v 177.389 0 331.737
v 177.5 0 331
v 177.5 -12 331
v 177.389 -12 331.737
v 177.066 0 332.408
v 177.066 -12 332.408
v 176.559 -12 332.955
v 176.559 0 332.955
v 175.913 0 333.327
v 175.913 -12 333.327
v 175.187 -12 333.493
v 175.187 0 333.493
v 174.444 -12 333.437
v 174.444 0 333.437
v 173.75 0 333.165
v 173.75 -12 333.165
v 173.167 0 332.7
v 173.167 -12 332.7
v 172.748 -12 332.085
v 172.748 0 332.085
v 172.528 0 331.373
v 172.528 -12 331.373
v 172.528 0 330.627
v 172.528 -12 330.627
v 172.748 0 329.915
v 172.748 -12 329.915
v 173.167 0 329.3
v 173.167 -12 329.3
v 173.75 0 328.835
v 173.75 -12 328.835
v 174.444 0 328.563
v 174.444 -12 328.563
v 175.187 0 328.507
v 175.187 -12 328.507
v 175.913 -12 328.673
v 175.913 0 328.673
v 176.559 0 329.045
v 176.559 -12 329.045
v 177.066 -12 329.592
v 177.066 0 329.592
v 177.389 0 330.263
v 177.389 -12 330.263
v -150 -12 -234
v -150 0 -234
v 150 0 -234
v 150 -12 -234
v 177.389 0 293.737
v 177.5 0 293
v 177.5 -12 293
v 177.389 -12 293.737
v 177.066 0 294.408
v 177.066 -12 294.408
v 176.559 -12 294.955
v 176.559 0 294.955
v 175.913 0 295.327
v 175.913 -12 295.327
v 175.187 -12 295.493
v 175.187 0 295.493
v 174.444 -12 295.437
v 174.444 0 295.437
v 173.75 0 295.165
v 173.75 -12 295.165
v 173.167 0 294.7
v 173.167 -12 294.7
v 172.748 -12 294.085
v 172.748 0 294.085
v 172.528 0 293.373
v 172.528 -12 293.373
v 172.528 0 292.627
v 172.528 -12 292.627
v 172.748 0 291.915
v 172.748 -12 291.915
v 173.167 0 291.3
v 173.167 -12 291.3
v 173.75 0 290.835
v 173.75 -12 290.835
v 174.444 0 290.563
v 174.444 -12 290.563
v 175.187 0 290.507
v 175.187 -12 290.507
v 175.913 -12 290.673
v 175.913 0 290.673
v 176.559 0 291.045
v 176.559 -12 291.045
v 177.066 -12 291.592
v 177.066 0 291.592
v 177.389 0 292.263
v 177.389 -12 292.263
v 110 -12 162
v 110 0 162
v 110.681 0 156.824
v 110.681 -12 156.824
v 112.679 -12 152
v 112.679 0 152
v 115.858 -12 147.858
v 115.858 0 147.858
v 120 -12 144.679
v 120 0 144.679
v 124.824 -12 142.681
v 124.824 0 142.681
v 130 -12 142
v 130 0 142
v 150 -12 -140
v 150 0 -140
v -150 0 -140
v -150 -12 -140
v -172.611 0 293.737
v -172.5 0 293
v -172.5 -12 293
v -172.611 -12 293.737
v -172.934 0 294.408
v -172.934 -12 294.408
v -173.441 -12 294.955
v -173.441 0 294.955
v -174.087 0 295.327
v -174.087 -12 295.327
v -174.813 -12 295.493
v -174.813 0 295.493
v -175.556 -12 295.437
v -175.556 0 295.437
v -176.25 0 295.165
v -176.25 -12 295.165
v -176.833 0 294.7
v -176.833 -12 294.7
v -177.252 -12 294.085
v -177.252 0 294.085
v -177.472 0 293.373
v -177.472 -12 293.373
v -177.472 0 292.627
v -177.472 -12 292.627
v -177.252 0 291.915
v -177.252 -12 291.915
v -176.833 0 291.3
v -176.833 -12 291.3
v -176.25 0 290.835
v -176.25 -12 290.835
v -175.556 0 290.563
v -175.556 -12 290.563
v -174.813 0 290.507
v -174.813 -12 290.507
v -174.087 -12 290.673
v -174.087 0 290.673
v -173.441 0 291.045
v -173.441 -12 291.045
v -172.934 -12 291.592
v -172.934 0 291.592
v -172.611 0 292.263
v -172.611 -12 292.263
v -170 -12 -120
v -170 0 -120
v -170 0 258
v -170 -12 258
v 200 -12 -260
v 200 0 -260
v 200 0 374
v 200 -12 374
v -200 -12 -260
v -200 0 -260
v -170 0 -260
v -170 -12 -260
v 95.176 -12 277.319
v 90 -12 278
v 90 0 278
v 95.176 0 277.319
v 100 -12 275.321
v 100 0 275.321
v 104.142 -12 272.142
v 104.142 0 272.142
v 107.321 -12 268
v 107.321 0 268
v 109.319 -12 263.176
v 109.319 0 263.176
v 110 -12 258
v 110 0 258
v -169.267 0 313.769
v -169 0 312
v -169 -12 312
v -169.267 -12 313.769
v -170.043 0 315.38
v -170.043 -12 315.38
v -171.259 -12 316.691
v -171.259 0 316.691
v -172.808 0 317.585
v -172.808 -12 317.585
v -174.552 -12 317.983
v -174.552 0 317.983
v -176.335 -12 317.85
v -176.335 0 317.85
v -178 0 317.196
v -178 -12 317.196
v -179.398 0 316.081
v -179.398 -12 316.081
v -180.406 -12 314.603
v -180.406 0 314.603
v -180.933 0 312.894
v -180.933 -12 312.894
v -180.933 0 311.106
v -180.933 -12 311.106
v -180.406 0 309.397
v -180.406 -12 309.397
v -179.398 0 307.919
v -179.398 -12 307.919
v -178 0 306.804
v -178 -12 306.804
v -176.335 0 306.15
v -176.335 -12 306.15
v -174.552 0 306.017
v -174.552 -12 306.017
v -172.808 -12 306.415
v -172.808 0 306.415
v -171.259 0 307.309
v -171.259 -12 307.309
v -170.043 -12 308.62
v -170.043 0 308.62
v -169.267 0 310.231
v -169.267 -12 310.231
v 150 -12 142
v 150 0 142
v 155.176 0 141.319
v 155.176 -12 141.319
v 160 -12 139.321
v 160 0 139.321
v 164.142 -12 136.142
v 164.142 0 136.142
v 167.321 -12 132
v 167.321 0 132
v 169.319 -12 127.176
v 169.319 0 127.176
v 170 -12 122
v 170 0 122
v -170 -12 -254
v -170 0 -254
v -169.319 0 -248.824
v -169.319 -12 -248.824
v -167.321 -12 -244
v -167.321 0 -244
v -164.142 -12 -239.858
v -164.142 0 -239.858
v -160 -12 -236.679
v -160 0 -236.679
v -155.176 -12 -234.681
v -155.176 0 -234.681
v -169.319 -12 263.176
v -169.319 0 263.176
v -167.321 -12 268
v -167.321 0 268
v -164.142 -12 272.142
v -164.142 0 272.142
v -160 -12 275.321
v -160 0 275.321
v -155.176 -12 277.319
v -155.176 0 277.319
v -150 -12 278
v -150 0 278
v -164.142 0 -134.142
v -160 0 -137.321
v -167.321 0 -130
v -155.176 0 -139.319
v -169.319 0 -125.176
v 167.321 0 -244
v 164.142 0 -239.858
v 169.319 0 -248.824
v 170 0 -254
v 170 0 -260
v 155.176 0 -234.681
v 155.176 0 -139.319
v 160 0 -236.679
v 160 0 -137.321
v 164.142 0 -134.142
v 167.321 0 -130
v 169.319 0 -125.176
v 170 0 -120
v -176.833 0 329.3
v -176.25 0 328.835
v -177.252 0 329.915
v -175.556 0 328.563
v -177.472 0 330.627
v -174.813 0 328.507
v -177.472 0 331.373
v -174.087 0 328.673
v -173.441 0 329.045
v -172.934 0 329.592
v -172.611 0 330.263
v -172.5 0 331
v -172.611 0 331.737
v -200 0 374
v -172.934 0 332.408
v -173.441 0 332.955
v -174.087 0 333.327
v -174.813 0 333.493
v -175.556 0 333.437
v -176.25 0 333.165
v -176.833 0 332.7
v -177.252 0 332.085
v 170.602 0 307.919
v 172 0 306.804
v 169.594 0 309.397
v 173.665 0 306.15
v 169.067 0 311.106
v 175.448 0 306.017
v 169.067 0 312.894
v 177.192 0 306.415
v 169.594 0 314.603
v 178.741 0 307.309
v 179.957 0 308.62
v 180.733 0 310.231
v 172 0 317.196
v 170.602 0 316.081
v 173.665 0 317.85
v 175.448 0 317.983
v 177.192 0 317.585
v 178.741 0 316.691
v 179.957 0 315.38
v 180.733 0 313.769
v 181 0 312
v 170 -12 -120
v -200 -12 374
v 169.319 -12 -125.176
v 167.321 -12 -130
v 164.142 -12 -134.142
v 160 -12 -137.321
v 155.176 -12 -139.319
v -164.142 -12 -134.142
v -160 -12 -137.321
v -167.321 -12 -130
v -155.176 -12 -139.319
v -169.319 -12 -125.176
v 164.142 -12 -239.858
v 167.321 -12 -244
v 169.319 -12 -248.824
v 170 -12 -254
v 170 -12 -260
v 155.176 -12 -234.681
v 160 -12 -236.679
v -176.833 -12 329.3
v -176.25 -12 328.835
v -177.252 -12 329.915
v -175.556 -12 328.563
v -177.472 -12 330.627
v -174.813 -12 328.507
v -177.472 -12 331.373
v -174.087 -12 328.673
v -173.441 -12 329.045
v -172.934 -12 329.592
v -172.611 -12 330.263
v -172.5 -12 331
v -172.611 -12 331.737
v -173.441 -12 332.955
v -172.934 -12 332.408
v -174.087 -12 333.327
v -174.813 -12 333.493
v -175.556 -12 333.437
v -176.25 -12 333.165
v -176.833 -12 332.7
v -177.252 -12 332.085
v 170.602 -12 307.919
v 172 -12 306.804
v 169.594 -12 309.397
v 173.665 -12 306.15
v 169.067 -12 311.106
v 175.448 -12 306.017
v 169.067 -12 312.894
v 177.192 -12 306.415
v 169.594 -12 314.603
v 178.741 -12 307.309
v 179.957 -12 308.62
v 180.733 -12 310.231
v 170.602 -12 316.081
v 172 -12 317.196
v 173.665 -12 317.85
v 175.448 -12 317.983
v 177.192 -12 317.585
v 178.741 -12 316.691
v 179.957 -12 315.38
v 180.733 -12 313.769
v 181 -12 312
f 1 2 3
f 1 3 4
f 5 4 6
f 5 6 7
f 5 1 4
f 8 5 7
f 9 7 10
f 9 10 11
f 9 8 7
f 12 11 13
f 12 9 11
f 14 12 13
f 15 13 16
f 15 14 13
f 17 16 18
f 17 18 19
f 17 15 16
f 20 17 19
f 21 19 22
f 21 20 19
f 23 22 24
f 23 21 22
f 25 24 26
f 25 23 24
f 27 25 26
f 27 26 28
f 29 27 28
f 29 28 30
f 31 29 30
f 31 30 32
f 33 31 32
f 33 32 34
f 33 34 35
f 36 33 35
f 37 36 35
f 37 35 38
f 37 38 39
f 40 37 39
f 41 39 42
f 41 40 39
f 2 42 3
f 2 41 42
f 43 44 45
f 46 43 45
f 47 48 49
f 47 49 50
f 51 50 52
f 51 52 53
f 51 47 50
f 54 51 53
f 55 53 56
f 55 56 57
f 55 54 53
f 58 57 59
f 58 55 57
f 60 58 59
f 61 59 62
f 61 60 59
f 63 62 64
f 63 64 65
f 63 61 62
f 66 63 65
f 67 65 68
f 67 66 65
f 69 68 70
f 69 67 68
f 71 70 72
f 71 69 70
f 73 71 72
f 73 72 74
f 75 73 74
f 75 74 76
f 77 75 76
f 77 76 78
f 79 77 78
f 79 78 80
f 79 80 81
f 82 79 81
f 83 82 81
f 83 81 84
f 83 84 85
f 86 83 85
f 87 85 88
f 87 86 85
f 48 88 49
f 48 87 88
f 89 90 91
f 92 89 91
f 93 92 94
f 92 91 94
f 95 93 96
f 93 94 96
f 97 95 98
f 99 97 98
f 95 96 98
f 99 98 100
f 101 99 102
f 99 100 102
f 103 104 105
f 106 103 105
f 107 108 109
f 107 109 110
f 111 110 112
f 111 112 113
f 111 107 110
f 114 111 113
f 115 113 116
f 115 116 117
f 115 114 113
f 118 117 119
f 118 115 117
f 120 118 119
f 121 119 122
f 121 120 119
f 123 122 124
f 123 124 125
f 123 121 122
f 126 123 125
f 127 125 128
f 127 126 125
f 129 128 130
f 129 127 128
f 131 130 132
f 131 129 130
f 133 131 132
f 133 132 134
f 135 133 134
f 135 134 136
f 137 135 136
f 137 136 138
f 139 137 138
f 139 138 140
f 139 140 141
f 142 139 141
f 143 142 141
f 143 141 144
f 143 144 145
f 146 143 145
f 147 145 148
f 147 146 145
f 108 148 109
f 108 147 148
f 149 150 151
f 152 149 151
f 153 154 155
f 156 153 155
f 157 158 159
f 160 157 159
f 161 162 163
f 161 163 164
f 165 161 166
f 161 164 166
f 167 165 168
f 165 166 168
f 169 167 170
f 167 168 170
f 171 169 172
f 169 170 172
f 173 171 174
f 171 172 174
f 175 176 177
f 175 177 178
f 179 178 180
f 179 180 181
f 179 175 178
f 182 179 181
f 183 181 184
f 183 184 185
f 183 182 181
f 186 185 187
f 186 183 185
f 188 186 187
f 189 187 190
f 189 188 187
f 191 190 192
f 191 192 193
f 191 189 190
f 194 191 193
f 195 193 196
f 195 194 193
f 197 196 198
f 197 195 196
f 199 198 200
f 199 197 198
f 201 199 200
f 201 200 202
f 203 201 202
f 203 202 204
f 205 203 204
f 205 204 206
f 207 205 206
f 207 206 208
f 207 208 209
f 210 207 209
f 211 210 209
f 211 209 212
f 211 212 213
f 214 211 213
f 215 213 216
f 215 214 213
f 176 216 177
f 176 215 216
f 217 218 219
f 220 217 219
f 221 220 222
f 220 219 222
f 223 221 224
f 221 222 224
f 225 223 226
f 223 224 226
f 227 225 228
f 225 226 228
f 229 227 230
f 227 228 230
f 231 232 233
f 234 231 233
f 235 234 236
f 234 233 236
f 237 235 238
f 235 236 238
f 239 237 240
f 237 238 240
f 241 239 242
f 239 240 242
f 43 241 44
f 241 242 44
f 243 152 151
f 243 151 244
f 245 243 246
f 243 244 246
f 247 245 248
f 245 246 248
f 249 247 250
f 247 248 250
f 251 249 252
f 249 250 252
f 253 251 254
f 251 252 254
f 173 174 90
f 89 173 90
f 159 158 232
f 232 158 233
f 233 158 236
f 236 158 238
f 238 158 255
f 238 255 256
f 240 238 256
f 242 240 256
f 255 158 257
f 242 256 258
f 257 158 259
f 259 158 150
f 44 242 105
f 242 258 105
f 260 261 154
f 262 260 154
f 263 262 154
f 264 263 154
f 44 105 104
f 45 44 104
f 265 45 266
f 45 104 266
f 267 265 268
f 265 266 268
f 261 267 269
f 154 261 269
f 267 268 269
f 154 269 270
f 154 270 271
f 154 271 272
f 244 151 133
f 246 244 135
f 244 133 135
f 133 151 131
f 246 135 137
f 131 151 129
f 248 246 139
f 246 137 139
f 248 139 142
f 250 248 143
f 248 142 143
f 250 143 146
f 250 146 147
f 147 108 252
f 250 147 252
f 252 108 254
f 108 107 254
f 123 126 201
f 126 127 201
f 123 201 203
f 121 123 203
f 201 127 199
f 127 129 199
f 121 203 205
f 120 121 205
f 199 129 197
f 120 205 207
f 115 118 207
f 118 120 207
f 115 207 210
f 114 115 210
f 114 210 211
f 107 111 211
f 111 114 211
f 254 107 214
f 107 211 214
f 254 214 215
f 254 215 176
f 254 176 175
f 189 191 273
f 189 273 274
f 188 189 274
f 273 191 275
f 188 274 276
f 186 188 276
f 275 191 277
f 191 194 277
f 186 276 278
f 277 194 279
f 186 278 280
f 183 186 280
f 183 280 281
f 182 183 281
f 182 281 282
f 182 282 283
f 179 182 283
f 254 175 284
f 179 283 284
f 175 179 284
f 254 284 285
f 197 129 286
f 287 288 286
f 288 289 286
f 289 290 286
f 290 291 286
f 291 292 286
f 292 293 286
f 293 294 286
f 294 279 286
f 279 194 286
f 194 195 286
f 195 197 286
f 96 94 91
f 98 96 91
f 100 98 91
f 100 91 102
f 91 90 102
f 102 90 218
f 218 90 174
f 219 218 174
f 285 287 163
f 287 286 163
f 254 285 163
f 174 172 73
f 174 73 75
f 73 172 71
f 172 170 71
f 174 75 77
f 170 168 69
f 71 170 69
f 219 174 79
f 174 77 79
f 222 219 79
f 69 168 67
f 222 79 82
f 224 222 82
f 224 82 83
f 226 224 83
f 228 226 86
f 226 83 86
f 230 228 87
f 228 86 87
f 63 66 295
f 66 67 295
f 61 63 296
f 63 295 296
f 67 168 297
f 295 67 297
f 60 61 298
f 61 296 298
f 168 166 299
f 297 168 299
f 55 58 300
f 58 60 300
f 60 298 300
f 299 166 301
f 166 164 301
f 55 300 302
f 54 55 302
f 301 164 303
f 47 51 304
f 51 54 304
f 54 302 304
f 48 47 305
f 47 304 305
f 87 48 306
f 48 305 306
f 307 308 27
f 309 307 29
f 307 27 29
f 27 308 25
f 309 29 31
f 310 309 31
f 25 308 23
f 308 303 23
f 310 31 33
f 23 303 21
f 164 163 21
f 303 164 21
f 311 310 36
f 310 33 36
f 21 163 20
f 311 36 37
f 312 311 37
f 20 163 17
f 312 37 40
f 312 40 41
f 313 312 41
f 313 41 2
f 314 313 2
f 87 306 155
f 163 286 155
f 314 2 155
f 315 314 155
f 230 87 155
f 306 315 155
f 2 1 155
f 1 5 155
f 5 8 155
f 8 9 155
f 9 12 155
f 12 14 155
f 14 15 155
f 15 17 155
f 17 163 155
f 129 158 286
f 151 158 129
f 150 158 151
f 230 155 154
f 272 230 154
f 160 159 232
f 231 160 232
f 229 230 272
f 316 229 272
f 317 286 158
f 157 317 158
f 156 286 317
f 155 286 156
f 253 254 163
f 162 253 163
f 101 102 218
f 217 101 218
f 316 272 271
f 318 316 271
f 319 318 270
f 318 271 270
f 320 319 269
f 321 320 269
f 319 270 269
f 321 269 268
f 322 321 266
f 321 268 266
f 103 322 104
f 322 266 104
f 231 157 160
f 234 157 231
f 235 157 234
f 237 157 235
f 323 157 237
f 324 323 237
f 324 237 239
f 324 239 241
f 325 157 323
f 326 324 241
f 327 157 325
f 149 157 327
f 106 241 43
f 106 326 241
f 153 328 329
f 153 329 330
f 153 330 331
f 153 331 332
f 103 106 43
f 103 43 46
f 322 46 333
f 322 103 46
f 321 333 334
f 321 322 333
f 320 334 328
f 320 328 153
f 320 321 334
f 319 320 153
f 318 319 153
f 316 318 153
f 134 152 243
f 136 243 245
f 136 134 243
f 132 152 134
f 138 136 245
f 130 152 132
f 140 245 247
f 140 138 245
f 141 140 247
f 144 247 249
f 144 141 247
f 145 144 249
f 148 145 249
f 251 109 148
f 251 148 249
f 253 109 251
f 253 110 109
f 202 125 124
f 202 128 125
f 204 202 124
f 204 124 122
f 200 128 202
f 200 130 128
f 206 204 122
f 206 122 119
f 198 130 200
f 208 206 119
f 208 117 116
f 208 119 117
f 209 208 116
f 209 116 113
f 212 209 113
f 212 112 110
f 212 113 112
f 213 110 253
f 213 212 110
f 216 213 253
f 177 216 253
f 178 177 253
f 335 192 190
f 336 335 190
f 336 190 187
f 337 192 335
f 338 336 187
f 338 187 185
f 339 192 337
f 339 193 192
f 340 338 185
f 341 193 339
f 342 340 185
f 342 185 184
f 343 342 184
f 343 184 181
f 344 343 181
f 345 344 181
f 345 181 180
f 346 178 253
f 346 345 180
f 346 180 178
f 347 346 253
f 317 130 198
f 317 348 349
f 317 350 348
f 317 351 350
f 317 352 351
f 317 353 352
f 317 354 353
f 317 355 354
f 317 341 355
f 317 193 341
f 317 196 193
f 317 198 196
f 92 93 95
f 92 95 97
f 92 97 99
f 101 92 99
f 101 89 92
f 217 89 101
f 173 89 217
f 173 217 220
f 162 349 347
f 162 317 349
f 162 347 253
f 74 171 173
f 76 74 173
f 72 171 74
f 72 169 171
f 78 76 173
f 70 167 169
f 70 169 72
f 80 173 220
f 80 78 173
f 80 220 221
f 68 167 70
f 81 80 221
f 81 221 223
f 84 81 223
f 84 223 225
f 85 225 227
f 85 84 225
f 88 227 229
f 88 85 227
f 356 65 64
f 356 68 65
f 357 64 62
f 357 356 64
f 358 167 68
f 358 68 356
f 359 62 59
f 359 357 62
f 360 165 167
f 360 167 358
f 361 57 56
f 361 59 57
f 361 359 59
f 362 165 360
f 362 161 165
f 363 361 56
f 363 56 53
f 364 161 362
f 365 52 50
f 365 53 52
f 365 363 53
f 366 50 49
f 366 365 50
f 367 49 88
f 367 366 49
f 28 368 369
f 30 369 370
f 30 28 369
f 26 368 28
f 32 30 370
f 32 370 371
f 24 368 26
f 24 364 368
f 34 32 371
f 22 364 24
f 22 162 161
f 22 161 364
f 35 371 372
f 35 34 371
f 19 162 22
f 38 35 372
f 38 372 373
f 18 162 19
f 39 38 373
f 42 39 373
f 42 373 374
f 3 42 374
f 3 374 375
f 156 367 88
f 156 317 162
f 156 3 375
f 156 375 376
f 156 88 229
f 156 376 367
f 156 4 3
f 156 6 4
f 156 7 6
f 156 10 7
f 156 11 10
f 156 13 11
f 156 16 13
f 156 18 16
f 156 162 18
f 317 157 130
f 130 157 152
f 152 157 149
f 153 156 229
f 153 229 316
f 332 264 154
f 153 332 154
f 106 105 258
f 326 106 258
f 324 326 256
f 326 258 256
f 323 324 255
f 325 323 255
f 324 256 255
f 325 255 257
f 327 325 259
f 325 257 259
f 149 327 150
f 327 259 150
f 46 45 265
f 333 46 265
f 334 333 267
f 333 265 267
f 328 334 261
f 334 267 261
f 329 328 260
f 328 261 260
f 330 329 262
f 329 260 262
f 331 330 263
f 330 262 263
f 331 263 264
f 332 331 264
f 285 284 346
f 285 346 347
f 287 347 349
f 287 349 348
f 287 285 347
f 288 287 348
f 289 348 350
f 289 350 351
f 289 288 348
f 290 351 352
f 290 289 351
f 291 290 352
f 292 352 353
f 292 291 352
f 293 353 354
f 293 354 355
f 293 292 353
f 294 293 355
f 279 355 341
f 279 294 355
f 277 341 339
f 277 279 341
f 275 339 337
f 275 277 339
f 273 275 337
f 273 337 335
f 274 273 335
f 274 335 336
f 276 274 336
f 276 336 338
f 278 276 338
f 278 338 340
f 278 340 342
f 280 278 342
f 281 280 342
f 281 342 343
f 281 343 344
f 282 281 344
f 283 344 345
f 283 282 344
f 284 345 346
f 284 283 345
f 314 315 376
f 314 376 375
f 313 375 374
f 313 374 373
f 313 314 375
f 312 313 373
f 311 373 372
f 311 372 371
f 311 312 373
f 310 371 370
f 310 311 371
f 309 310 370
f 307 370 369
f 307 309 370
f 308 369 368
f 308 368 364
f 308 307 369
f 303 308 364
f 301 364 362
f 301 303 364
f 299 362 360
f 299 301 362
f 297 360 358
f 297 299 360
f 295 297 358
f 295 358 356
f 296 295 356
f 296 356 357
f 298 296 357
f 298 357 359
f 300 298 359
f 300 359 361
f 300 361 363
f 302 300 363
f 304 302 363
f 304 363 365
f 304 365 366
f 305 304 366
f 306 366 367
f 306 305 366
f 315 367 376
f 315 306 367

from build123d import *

# Parameters (mm, degrees)
F1_W     = 400
F1_H     = 524
F1_R     = 2.5
F1_R_2   = 6
F1_H_2   = 12
F1_H_3   = 60
F2_DEPTH = 12


with BuildPart() as f2:
    # F1 (on Front) → F2 (new body)
    with BuildSketch(Plane.XZ):
        with Locations((0, 112)):
            Rectangle(F1_W, F1_H)
        with Locations((-175, 293)):
            Circle(F1_R, mode=Mode.SUBTRACT)
        with Locations((-175, 312)):
            Circle(F1_R_2, mode=Mode.SUBTRACT)
        with Locations((-175, 331)):
            Circle(F1_R, mode=Mode.SUBTRACT)
        with BuildLine():
            Line((-150, 278), (90, 278))
            ThreePointArc((90, 278), (104.1421356237, 272.1421356237), (110, 258))
            Line((110, 258), (110, 162))
            ThreePointArc((110, 162), (115.8578643763, 147.8578643763), (130, 142))
            Line((130, 142), (150, 142))
            ThreePointArc((150, 142), (164.1421356237, 136.1421356237), (170, 122))
            Line((170, 122), (170, -120))
            ThreePointArc((170, -120), (164.1421356237, -134.1421356237), (150, -140))
            Line((150, -140), (-150, -140))
            ThreePointArc((-150, -140), (-164.1421356237, -134.1421356237), (-170, -120))
            Line((-170, -120), (-170, 258))
            ThreePointArc((-170, 258), (-164.1421356237, 272.1421356237), (-150, 278))
        make_face(mode=Mode.SUBTRACT)
        with Locations((175, 293)):
            Circle(F1_R, mode=Mode.SUBTRACT)
        with Locations((175, 312)):
            Circle(F1_R_2, mode=Mode.SUBTRACT)
        with Locations((175, 331)):
            Circle(F1_R, mode=Mode.SUBTRACT)
        with Locations((0, -156)):
            Rectangle(F1_W, F1_H_2)
        with Locations((0, -192)):
            Rectangle(F1_W, F1_H_3)
        Polygon((200, -234), (200, -222), (-200, -222), (-200, -234), (-150, -234), (150, -234), align=None)
        with BuildLine():
            Line((200, -260), (200, -234))
            Line((200, -234), (150, -234))
            ThreePointArc((150, -234), (164.1421356237, -239.8578643763), (170, -254))
            Line((170, -254), (170, -260))
            Line((170, -260), (200, -260))
        make_face()
        with BuildLine():
            Line((-150, -234), (-200, -234))
            Line((-200, -234), (-200, -260))
            Line((-200, -260), (-170, -260))
            Line((-170, -260), (-170, -254))
            ThreePointArc((-170, -254), (-164.1421356237, -239.8578643763), (-150, -234))
        make_face()
    extrude(amount=F2_DEPTH)


solid = f2.part
